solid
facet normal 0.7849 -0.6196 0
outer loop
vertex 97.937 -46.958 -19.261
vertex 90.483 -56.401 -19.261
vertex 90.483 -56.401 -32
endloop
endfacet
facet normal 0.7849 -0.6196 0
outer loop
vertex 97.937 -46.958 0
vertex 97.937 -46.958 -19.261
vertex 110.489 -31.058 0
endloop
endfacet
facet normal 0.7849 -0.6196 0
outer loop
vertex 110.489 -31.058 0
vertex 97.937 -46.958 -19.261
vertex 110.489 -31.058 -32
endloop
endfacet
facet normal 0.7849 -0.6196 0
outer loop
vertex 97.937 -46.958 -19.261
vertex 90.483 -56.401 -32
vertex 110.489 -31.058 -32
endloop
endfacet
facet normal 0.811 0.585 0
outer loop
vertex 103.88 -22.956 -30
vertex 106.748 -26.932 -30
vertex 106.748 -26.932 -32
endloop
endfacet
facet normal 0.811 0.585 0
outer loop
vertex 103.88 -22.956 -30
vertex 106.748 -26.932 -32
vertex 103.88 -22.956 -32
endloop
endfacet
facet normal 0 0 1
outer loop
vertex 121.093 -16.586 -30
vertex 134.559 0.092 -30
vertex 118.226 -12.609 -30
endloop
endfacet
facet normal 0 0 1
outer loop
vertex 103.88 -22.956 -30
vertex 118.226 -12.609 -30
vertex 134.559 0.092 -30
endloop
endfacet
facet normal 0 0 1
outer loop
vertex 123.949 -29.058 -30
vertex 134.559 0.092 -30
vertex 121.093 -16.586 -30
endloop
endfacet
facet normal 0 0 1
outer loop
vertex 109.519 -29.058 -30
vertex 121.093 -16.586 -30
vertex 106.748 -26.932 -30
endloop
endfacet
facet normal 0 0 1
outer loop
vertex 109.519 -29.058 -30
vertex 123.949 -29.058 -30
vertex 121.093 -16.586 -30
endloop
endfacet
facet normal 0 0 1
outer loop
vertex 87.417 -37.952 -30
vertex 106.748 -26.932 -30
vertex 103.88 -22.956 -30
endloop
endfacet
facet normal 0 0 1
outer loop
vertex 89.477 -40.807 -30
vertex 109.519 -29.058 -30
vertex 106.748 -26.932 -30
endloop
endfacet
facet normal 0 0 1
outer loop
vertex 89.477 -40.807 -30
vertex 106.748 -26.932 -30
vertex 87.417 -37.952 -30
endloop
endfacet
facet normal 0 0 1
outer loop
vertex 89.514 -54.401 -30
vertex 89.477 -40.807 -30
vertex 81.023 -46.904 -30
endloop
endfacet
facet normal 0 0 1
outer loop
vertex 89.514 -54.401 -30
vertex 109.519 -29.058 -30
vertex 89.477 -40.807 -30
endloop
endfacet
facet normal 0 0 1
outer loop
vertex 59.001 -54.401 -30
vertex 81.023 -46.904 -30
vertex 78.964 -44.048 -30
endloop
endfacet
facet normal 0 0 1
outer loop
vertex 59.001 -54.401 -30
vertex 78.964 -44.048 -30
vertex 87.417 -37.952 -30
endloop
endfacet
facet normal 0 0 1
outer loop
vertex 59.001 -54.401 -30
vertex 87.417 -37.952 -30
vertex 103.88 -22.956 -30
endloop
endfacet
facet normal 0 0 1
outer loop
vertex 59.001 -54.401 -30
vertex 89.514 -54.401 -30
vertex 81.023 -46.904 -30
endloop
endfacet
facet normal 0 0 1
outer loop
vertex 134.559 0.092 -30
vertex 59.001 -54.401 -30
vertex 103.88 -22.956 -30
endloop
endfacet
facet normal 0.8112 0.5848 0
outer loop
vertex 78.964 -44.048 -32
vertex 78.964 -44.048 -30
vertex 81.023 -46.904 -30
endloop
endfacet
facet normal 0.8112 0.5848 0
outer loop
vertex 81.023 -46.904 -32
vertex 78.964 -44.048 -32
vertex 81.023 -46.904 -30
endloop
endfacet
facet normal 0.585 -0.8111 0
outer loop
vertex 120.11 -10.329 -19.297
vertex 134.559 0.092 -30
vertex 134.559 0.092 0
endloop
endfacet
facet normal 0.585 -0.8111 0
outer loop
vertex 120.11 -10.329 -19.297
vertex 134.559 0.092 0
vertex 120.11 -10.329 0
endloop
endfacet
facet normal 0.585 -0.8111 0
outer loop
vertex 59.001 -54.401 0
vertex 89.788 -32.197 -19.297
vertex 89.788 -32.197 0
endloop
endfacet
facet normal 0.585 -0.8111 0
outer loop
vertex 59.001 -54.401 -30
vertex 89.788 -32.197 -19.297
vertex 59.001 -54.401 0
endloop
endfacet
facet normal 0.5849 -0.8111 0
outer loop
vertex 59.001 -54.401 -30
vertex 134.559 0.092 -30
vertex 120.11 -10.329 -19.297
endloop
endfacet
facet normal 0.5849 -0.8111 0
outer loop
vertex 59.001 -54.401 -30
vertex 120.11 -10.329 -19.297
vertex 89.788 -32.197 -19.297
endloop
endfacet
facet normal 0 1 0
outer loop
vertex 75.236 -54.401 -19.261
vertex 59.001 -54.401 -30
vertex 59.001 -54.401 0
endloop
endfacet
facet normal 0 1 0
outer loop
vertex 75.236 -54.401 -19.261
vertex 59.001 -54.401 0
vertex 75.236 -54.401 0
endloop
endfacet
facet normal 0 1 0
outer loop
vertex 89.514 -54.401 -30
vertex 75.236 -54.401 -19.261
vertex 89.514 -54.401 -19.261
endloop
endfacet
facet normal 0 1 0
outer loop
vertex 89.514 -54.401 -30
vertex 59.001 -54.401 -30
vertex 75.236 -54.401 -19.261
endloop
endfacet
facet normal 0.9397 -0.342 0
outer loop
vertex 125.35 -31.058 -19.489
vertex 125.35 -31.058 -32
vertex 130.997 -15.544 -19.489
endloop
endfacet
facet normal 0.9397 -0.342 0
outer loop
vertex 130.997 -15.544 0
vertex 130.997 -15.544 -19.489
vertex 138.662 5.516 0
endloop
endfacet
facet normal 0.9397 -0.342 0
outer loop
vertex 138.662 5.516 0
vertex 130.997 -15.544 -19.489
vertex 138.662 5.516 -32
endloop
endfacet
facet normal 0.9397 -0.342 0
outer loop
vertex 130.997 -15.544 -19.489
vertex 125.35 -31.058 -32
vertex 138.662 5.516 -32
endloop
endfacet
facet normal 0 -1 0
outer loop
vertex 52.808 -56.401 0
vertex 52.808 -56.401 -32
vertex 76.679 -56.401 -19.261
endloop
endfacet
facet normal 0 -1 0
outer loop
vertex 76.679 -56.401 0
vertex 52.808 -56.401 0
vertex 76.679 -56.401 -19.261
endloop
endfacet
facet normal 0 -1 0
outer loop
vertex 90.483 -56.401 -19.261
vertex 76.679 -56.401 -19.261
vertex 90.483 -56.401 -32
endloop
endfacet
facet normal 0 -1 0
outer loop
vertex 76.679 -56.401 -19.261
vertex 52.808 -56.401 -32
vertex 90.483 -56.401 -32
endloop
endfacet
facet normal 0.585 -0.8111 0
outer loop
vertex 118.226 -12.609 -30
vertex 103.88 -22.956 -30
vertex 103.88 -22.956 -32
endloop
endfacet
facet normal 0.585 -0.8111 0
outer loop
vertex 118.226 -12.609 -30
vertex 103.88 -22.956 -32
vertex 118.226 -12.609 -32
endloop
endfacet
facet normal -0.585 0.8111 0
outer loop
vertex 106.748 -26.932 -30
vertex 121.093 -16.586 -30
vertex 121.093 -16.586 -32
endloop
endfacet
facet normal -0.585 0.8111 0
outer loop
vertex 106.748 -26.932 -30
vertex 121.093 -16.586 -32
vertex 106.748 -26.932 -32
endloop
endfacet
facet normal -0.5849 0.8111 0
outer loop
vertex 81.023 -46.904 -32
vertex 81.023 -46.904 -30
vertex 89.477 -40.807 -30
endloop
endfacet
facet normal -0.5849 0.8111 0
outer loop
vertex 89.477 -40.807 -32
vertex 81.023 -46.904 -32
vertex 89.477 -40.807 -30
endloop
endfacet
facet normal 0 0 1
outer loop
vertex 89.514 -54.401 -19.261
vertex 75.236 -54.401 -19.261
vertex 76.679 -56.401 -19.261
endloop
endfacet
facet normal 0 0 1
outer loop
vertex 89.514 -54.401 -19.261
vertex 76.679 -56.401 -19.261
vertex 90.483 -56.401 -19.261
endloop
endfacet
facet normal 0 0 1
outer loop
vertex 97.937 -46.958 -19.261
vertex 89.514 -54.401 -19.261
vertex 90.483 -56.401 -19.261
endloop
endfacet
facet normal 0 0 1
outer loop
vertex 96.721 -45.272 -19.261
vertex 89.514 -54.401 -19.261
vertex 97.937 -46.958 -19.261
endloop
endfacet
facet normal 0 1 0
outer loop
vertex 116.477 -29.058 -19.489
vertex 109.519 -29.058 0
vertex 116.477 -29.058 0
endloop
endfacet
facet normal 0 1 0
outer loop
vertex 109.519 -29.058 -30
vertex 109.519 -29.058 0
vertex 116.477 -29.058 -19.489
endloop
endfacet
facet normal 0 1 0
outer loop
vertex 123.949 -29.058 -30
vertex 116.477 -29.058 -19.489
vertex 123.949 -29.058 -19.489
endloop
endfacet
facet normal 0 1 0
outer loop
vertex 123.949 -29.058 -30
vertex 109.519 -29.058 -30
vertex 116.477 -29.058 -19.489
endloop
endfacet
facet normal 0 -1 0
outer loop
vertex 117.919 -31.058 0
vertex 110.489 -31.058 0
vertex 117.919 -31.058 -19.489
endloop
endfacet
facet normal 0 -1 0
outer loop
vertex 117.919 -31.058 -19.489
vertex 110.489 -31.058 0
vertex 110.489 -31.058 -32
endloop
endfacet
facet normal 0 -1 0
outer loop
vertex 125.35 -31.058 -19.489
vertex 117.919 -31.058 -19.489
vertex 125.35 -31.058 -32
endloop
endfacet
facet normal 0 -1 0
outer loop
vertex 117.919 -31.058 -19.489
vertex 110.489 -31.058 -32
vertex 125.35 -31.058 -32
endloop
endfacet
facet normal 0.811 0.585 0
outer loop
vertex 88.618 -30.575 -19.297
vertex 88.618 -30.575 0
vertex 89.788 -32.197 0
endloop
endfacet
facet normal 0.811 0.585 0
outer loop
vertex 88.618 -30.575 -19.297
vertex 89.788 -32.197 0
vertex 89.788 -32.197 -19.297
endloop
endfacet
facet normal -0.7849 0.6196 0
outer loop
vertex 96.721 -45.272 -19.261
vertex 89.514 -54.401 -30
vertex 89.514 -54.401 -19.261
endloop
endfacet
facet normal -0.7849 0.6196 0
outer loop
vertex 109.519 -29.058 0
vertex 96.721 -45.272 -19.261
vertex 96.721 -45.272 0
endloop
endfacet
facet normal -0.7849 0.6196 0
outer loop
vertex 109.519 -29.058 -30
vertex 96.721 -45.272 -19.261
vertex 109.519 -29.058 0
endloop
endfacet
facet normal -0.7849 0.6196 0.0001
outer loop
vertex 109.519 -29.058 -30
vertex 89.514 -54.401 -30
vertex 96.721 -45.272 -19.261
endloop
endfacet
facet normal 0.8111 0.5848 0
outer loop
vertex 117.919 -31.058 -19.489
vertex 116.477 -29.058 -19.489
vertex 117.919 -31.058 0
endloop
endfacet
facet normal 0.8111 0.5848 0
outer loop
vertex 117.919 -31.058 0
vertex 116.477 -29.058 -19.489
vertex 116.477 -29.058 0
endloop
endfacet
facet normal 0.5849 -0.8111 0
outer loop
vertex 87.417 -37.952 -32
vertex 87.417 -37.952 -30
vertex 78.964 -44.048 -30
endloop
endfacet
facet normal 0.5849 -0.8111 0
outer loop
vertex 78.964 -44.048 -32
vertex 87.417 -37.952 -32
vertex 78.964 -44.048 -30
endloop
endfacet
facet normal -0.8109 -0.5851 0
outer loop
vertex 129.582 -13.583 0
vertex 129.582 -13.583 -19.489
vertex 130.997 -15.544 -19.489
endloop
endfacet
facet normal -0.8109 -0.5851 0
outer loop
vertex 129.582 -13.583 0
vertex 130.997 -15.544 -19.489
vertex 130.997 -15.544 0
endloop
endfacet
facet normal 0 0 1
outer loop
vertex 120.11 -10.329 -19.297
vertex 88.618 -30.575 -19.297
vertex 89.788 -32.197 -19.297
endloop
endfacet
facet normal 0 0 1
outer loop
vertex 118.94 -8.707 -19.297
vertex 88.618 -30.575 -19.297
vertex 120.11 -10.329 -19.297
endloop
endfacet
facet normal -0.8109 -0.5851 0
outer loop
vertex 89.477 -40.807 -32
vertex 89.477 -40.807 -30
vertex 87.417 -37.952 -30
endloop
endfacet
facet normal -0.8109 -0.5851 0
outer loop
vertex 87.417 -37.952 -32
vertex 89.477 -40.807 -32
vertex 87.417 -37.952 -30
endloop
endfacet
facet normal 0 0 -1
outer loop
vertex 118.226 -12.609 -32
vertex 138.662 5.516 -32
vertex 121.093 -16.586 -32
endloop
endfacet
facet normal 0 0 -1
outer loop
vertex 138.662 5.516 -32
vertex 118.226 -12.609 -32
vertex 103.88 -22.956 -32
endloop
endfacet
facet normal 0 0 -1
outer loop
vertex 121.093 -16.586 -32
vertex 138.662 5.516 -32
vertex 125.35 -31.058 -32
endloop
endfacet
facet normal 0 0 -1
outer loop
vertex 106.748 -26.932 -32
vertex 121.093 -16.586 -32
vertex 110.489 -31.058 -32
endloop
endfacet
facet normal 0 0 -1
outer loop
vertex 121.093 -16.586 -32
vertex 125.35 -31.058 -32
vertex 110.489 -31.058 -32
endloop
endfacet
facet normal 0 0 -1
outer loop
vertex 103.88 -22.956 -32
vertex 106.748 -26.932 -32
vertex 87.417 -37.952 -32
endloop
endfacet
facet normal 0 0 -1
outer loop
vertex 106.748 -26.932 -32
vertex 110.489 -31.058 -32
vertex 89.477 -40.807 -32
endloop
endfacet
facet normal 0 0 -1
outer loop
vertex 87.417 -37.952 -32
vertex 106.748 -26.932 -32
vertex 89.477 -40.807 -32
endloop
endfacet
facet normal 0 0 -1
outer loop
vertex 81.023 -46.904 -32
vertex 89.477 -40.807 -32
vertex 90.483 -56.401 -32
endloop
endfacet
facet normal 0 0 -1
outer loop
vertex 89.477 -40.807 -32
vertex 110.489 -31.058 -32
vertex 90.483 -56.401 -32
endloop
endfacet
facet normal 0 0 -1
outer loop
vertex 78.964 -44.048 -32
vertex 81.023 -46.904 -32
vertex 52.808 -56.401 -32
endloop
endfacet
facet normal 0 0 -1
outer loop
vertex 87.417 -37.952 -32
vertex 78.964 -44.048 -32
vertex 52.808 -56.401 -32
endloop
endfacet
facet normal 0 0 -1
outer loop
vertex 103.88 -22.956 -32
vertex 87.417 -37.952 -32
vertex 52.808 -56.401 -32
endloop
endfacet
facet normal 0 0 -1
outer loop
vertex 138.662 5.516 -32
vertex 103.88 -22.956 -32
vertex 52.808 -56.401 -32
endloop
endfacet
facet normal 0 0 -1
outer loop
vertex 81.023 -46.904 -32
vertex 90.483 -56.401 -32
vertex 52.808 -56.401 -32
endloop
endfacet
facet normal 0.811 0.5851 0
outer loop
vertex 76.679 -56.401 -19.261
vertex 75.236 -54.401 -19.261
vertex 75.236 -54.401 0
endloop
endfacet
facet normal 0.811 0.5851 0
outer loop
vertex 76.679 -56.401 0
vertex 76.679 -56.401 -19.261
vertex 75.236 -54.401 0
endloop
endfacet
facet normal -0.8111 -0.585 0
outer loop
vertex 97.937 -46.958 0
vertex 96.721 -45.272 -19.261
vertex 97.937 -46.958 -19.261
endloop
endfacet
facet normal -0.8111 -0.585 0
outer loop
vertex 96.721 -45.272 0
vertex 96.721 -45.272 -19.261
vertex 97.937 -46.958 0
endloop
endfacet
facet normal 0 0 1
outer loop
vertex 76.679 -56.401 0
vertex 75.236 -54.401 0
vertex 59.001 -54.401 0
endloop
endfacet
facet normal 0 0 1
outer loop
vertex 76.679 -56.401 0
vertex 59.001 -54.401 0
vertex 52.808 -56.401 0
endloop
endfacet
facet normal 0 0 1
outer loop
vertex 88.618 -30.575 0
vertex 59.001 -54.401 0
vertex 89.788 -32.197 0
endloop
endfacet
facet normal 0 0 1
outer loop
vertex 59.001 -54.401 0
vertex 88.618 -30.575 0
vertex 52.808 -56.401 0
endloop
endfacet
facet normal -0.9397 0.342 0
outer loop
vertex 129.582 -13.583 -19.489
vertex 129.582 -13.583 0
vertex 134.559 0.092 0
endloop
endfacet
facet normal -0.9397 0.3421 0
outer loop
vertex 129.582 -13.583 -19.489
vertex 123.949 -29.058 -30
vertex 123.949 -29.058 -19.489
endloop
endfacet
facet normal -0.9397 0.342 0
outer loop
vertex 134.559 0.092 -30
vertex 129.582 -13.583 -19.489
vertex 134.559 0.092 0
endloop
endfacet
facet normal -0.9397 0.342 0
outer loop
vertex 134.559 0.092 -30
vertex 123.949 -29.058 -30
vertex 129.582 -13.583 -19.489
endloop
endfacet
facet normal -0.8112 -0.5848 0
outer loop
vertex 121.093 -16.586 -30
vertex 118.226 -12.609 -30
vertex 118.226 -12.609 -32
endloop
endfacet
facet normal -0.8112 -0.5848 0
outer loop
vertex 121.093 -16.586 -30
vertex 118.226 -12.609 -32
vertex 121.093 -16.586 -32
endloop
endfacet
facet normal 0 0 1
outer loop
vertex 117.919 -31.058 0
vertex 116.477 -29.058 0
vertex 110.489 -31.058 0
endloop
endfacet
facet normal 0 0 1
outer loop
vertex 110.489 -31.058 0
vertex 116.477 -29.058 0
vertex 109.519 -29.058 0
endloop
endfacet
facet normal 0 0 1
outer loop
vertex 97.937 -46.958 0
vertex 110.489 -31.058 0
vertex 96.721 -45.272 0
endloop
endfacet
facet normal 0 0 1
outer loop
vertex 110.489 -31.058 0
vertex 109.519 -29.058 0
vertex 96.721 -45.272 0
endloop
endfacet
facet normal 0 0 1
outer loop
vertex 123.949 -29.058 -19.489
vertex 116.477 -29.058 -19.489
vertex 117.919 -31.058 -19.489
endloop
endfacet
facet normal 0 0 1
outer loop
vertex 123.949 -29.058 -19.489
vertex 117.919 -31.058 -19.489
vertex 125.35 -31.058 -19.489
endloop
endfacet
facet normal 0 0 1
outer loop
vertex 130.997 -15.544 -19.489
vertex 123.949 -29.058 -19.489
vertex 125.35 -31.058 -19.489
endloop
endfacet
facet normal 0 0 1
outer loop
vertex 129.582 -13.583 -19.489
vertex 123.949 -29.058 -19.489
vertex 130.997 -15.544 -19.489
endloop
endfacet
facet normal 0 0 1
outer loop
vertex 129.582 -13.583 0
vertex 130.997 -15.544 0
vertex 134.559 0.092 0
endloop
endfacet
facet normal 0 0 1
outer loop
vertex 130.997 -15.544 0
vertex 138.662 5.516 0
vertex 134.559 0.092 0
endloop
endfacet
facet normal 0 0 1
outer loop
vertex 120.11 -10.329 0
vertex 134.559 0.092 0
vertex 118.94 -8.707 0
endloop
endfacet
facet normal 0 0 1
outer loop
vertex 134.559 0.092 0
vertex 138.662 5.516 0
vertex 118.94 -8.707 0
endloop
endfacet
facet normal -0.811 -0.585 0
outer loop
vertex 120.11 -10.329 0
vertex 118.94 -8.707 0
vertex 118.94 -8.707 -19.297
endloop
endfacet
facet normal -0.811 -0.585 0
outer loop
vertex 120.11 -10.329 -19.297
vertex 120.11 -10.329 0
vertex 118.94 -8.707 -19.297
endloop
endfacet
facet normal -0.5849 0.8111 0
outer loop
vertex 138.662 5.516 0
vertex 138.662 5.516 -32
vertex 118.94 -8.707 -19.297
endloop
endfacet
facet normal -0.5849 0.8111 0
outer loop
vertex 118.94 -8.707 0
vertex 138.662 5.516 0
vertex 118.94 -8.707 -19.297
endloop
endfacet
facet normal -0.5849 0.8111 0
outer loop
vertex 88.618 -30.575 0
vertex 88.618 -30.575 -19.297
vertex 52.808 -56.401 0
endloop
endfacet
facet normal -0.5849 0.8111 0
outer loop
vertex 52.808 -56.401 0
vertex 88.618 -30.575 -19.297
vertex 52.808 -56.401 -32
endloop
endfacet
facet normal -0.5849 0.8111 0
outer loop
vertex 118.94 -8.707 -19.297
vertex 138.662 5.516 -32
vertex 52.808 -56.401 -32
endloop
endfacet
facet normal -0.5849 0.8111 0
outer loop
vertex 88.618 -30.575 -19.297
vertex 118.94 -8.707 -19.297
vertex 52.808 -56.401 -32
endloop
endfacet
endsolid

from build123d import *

# Parameters (mm, degrees)
SHELL_3_T            = 2
SKETCH_10_W          = 22.765402734
SKETCH_10_H          = 19.26138917
SKETCH_10_W_2        = 19.681614291
SKETCH_10_H_2        = 19.489043198
CUT_EXTRUDE_8_DEPTH  = 49
SKETCH_9_W           = 37.384578993
SKETCH_9_H           = 19.297136137
CUT_EXTRUDE_5_DEPTH  = 10
CUT_EXTRUDE_10_DEPTH = 49


with BuildPart() as part:
    # 草图5 → 放样2 section 0
    with BuildSketch(Plane.XY):
        with BuildLine():
            Line((123.949416554, -29.058070489), (134.559011277, 0.091551442))
            Line((134.559011277, 0.091551442), (59.000774753, -54.400934133))
            Line((59.000774753, -54.400934133), (89.51414806, -54.400934133))
            Line((89.51414806, -54.400934133), (109.519294053, -29.058070489))
            Line((109.519294053, -29.058070489), (123.949416554, -29.058070489))
        make_face()
    # 草图2 → 放样2 section 1
    with BuildSketch(Plane.XY.offset(-30)):
        with BuildLine():
            Line((134.559011277, 0.091551442), (123.949416554, -29.058070489))
            Line((123.949416554, -29.058070489), (109.519294053, -29.058070489))
            Line((109.519294053, -29.058070489), (89.51414806, -54.400934133))
            Line((89.51414806, -54.400934133), (59.000774753, -54.400934133))
            Line((59.000774753, -54.400934133), (134.559011277, 0.091551442))
        make_face()
    loft()

    # 抽壳3
    shell_3_openings = [part.faces().sort_by_distance(p)[0] for p in [
        (99.793796859, -32.953132271, 0),
    ]]
    offset(amount=SHELL_3_T, openings=shell_3_openings, kind=Kind.INTERSECTION)

    # 草图10 → 切除-拉伸8 (cut)
    with BuildSketch(Plane(origin=(45.99732156, -63.779004852, 0), x_dir=(0.8110731554347567, 0.5849447294686114, 0), z_dir=(0.5849447294686114, -0.8110731554347567, 0))):
        with Locations((40.58343187, -9.630694585)):
            Rectangle(SKETCH_10_W, SKETCH_10_H)
        with Locations((87.31465052, -9.744521599)):
            Rectangle(SKETCH_10_W_2, SKETCH_10_H_2)
    extrude(amount=CUT_EXTRUDE_8_DEPTH, mode=Mode.SUBTRACT)

    # 草图9 → 切除-拉伸5 (cut)
    with BuildSketch(Plane(origin=(44.827432101, -62.156858541, 0), x_dir=(0.8110731554347567, 0.5849447294686114, 0), z_dir=(-0.5849447294686114, 0.8110731554347567, 0))):
        with Locations((72.683721601, 9.648568069)):
            Rectangle(SKETCH_9_W, SKETCH_9_H)
    extrude(amount=-CUT_EXTRUDE_5_DEPTH, mode=Mode.SUBTRACT)

    # 草图13 → 切除-拉伸10 (cut)
    with BuildSketch(Plane.XY.offset(-30)):
        Polygon((78.963932985, -44.04826302), (81.023403307, -46.903885112), (89.476536517, -40.807498262), (87.417066196, -37.95187617), align=None)
        Polygon((103.880127445, -22.95550088), (118.225703578, -12.609493132), (121.093195937, -16.585503101), (106.747619804, -26.931510849), align=None)
    extrude(amount=-CUT_EXTRUDE_10_DEPTH, mode=Mode.SUBTRACT)


solid = part.part
